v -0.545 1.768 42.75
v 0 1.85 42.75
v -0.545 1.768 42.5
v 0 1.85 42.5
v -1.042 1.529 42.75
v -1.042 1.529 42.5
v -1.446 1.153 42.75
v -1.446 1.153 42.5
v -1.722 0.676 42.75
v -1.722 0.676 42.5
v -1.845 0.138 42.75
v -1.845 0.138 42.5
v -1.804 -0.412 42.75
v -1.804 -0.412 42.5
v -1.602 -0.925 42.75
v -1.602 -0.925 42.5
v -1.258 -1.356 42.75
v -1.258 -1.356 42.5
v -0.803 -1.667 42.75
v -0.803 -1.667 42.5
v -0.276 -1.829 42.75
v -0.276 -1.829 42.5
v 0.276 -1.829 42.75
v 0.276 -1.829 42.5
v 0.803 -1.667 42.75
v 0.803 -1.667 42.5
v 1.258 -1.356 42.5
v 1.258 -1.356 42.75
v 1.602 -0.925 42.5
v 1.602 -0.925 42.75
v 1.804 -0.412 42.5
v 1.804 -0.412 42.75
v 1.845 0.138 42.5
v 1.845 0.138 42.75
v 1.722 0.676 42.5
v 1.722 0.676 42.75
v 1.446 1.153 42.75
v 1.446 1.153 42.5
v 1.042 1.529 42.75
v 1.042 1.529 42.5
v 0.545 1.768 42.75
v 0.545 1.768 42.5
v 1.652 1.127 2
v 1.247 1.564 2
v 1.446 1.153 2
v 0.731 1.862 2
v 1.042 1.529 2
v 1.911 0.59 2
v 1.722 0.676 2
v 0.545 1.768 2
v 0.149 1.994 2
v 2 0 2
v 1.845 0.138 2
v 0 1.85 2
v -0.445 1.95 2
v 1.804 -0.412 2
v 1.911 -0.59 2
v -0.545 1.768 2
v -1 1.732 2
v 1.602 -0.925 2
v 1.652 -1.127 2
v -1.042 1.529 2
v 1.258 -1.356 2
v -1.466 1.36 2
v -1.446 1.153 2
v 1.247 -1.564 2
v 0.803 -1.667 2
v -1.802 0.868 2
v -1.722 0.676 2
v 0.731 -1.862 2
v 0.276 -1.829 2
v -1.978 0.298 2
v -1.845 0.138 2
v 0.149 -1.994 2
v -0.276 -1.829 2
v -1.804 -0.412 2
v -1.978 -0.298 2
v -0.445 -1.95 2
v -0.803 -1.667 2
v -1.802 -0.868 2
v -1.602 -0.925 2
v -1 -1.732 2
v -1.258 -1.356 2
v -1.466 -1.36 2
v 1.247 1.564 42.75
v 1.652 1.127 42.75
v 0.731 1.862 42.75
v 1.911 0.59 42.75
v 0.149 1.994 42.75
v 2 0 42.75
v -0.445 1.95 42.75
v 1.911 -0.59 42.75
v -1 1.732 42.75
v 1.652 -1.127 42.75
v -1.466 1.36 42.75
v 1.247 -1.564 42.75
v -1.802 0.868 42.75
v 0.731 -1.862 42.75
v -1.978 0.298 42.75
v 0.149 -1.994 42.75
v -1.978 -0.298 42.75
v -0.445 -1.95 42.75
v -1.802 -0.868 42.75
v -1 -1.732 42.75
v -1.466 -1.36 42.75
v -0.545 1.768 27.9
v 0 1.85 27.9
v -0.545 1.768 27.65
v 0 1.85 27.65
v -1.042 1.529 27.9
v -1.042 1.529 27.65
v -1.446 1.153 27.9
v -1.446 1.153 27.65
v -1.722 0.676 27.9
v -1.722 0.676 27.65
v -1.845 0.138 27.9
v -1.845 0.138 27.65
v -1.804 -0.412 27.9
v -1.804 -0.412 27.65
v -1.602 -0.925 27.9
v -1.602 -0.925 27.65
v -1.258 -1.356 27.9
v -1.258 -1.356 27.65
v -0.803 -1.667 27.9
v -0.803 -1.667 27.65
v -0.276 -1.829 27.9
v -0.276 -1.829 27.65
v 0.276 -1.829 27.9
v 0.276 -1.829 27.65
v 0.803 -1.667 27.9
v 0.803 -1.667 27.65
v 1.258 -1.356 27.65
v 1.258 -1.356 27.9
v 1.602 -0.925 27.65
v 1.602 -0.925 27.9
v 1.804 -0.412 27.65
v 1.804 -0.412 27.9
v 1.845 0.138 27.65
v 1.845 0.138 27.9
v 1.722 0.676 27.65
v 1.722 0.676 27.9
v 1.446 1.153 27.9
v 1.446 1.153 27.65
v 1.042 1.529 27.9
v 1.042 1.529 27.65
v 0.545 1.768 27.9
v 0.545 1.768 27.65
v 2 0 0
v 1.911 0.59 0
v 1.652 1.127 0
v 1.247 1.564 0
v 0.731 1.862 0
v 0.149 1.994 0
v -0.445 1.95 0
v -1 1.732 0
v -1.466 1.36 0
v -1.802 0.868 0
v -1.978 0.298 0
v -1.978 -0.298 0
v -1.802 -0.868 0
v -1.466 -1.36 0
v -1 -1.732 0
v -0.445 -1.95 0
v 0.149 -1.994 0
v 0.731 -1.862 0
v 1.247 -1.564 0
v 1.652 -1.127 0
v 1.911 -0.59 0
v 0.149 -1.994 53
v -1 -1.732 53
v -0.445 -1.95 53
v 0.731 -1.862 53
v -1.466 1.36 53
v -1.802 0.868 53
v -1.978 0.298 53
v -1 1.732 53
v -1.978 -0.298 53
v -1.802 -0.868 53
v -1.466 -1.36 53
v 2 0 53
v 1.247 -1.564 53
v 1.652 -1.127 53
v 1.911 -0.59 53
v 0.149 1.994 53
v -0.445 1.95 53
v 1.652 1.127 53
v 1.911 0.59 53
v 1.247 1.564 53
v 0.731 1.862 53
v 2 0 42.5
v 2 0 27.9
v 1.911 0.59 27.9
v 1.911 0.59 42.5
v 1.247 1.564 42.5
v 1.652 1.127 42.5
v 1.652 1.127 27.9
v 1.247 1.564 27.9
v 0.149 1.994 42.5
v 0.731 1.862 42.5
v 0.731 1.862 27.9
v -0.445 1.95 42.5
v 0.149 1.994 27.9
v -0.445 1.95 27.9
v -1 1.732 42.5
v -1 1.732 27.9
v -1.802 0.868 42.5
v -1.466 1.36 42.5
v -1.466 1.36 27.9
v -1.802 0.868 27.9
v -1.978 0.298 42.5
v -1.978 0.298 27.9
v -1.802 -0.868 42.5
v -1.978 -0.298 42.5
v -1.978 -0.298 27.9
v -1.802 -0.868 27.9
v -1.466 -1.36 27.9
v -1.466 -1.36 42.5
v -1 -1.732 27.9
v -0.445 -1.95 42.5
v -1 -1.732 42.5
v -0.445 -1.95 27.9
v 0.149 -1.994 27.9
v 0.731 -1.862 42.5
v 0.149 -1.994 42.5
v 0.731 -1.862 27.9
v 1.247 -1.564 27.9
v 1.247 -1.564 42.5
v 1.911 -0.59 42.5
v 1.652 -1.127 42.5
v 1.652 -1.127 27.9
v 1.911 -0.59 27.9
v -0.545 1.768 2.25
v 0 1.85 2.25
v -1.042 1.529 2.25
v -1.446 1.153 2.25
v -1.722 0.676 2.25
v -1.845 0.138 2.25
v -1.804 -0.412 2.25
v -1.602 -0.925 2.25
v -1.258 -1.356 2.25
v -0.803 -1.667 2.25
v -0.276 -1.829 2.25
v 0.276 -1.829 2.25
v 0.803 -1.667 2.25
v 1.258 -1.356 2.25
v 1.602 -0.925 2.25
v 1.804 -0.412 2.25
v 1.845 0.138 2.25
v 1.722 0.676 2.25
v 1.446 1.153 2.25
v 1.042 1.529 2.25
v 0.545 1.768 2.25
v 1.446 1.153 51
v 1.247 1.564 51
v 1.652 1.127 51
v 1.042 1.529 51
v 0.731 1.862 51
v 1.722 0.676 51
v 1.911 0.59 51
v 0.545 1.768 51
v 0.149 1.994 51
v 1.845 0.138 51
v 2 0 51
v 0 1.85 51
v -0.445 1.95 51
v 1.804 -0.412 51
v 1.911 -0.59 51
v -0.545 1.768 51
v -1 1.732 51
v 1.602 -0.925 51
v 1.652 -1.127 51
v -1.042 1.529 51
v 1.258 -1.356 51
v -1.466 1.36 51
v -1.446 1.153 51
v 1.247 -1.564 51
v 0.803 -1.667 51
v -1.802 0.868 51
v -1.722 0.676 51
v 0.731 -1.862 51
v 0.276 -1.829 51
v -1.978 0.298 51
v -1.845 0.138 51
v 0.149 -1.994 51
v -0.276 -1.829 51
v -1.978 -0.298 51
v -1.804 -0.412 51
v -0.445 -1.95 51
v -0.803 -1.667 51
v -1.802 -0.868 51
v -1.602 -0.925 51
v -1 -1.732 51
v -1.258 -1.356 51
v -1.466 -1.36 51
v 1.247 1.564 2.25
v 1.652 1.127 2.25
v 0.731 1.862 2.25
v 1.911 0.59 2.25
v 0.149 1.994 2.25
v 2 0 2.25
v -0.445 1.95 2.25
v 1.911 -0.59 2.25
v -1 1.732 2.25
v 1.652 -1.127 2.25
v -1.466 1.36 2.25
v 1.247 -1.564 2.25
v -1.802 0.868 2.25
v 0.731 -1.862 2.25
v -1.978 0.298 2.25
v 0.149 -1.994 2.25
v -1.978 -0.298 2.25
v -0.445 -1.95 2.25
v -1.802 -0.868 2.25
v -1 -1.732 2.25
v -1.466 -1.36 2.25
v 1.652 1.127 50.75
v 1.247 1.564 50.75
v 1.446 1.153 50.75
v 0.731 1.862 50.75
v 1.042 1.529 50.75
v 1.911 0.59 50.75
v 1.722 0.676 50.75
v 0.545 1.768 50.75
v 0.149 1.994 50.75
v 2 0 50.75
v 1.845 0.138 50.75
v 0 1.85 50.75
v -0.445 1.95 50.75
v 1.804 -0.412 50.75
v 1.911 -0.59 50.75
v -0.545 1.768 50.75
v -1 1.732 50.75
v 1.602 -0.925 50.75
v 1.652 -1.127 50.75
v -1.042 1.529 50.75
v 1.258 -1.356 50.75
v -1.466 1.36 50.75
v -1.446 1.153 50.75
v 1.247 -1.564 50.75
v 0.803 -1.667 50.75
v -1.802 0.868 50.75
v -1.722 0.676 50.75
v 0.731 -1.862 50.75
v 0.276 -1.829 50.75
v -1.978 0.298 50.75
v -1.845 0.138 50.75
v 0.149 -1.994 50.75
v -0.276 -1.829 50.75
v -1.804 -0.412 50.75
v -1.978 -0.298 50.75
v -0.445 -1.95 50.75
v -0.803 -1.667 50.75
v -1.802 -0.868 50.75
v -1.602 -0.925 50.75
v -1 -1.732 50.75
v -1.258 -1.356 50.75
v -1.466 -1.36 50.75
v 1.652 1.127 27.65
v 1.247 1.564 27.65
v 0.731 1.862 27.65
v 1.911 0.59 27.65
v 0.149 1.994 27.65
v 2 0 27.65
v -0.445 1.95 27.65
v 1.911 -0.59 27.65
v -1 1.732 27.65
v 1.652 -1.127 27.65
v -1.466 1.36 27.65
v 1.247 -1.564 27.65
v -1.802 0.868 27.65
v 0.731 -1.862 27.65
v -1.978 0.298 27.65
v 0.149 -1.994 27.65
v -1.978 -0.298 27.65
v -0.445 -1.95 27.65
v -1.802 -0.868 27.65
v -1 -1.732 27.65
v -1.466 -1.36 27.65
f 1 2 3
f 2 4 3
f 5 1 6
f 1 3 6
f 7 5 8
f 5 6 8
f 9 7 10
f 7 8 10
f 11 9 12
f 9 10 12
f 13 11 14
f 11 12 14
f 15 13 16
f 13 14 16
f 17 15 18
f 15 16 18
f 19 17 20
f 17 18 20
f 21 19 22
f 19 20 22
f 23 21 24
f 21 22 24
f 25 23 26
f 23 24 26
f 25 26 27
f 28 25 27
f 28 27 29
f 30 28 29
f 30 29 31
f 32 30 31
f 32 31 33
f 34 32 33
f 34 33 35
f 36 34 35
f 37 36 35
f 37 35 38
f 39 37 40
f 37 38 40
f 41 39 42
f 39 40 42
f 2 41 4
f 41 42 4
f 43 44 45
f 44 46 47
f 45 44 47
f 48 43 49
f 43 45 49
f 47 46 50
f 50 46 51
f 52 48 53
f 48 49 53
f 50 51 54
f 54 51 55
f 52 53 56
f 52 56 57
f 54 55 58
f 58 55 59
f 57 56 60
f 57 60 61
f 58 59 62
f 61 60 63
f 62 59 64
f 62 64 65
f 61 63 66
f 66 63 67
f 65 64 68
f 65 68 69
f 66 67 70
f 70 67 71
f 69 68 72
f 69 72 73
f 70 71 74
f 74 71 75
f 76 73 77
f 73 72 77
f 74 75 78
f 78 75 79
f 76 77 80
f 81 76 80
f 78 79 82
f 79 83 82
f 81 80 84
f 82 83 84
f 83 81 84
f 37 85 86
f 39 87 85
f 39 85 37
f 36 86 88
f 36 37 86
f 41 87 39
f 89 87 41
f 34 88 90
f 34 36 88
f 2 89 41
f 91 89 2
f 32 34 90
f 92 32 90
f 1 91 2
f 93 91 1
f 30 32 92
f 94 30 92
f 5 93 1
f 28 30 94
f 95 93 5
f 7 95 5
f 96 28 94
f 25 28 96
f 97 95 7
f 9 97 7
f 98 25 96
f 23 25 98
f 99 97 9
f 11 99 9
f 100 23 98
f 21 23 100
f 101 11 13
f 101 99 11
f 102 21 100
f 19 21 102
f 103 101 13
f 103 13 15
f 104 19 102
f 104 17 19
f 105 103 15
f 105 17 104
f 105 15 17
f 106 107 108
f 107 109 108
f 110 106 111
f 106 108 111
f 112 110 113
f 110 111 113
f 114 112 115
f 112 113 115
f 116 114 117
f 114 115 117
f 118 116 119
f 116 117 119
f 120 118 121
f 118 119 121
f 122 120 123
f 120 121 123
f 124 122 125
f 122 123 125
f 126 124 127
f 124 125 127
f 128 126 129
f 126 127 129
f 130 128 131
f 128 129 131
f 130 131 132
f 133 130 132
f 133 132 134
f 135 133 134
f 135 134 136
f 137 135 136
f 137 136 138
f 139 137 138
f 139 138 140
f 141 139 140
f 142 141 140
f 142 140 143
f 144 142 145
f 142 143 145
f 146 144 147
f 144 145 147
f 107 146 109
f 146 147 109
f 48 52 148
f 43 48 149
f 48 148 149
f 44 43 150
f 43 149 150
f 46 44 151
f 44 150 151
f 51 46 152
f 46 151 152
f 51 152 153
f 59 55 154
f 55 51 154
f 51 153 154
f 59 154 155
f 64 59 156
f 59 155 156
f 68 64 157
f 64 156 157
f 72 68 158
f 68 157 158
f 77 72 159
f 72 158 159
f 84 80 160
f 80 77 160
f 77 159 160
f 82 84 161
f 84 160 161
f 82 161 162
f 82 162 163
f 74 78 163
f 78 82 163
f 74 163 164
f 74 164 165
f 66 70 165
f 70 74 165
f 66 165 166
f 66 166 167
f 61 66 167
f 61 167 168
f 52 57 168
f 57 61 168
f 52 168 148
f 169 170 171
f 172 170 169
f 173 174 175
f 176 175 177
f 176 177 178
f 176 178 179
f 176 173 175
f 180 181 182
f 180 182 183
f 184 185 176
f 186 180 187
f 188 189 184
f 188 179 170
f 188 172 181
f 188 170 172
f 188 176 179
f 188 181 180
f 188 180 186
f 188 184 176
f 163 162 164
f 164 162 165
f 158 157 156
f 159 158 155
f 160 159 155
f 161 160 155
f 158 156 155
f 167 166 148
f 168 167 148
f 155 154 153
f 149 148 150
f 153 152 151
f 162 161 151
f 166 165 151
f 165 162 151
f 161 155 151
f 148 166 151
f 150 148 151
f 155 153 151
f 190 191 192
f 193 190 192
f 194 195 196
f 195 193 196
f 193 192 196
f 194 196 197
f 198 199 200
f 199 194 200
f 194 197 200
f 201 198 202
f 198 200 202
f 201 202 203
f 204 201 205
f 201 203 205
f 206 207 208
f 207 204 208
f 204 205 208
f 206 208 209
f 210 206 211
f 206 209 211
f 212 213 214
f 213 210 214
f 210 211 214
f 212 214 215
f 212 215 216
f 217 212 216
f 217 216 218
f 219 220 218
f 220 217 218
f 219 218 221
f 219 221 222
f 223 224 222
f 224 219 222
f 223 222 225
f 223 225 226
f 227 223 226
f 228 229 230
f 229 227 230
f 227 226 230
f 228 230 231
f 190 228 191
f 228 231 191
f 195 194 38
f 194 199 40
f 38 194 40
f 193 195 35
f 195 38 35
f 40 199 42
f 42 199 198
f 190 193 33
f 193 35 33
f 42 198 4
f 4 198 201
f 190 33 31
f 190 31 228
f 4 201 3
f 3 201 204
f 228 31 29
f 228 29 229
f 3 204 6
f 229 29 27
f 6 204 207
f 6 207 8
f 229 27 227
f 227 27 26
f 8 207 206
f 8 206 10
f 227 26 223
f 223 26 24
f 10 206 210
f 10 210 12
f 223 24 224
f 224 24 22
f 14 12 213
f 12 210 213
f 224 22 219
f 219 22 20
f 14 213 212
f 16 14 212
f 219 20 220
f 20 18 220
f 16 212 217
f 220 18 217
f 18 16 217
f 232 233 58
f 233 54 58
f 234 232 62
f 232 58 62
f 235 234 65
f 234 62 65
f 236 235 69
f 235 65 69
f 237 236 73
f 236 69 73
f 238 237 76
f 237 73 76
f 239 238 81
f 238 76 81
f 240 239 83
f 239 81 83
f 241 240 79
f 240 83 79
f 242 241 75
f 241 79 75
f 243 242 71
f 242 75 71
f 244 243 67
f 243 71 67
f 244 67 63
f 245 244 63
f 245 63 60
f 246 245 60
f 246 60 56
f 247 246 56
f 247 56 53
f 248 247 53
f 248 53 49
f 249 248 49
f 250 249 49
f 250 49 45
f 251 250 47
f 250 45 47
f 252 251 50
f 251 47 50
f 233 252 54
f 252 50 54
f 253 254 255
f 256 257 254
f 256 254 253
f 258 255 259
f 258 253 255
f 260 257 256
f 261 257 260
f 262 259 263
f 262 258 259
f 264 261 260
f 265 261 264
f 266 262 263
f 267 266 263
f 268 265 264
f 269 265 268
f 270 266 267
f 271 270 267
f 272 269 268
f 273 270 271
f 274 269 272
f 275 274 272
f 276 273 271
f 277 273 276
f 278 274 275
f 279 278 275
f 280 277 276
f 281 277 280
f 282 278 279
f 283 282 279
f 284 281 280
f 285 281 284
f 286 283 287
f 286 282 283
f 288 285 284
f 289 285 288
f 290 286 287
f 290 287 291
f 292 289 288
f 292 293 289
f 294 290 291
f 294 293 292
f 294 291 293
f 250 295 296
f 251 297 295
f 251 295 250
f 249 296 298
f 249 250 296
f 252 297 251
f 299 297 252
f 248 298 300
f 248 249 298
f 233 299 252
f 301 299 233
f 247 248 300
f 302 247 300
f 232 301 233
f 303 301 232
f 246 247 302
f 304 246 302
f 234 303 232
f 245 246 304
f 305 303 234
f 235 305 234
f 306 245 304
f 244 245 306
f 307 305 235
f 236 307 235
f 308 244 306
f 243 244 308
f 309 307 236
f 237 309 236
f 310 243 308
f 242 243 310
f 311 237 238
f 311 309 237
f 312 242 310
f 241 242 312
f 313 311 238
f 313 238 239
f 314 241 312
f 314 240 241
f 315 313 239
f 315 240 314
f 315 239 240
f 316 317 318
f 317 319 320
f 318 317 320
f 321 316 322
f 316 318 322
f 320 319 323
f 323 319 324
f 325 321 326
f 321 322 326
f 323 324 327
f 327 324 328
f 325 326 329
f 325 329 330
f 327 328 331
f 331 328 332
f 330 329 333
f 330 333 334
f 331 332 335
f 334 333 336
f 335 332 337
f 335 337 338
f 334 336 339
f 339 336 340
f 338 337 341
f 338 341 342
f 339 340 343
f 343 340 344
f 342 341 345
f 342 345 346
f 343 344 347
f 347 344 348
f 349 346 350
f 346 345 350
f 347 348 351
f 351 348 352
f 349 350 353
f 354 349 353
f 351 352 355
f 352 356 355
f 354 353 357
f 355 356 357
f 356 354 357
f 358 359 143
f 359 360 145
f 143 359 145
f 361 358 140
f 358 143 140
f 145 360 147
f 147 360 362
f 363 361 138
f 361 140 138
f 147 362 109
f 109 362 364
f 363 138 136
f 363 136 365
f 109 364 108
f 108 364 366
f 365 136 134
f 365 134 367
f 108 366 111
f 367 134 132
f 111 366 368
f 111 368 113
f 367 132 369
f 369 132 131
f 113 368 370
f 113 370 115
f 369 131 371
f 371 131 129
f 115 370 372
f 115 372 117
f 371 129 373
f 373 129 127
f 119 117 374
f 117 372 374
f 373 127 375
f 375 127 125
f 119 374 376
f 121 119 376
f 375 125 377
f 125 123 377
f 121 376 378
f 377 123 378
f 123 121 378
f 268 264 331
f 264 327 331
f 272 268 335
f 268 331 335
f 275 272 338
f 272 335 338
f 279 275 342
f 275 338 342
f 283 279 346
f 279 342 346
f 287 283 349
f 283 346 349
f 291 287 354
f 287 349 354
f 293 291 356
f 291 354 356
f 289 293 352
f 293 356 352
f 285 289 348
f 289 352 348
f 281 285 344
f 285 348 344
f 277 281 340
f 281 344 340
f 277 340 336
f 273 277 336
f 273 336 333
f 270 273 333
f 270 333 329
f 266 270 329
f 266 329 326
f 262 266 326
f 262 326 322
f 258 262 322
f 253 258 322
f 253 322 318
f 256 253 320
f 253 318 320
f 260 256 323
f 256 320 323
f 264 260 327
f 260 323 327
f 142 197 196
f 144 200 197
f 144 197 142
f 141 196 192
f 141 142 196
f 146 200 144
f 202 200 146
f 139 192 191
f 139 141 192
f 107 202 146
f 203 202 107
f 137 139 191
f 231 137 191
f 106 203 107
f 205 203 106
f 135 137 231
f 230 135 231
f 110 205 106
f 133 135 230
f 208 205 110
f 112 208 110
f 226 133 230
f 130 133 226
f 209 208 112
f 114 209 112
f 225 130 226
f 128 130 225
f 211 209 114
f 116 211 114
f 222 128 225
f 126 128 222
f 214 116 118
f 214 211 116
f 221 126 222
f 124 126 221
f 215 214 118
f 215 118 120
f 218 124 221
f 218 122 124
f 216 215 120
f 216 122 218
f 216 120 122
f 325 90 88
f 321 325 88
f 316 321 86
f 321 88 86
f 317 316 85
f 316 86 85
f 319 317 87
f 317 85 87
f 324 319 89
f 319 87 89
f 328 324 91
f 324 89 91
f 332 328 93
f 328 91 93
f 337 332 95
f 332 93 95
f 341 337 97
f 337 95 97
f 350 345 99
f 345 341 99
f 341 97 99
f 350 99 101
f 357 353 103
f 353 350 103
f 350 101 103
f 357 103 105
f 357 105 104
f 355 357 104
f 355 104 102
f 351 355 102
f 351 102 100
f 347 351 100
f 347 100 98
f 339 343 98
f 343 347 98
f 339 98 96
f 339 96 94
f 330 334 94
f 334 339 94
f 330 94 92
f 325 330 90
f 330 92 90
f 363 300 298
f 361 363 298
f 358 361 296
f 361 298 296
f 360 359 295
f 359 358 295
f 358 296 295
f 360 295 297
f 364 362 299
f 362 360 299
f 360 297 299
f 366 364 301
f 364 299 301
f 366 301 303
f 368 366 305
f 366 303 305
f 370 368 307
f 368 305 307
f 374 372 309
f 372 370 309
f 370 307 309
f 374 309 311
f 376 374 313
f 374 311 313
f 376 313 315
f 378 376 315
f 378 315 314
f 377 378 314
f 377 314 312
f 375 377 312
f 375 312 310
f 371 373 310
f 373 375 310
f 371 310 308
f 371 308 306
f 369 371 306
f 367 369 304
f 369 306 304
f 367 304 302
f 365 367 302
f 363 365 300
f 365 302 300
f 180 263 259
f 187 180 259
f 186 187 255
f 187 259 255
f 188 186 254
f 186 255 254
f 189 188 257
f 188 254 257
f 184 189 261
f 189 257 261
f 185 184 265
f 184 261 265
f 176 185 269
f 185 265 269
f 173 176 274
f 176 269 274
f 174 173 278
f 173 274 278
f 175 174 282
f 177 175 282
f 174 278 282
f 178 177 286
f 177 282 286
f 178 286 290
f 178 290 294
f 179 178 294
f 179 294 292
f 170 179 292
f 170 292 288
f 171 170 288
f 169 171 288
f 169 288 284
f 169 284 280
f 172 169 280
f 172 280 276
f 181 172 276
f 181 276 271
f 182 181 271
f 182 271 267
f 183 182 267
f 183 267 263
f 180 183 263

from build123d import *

# Parameters (mm, degrees)
CROQUIS1_R              = 2
SALIENTE_EXTRUIR1_DEPTH = 53
CROQUIS2_W              = 0.25
CROQUIS2_H              = 2


with BuildPart() as part:
    # Croquis1 → Saliente-Extruir1 (new body)
    with BuildSketch(Plane.XY):
        Circle(CROQUIS1_R)
    extrude(amount=SALIENTE_EXTRUIR1_DEPTH)

    # Croquis2 → Cortar-Revolución1 (revolve, cut)
    with BuildSketch(Plane(origin=(0, 0, 0), x_dir=(0, 0, -1), z_dir=(1, 0, 0))):
        with Locations((-50.875, 2.85)):
            Rectangle(CROQUIS2_W, CROQUIS2_H)
        with Locations((-42.625, 2.85)):
            Rectangle(CROQUIS2_W, CROQUIS2_H)
        with Locations((-2.125, 2.85)):
            Rectangle(CROQUIS2_W, CROQUIS2_H)
        with Locations((-27.775, 2.85)):
            Rectangle(CROQUIS2_W, CROQUIS2_H)
    revolve(axis=Axis((0, 0, 0), (0, 0, 1)), mode=Mode.SUBTRACT)


solid = part.part
